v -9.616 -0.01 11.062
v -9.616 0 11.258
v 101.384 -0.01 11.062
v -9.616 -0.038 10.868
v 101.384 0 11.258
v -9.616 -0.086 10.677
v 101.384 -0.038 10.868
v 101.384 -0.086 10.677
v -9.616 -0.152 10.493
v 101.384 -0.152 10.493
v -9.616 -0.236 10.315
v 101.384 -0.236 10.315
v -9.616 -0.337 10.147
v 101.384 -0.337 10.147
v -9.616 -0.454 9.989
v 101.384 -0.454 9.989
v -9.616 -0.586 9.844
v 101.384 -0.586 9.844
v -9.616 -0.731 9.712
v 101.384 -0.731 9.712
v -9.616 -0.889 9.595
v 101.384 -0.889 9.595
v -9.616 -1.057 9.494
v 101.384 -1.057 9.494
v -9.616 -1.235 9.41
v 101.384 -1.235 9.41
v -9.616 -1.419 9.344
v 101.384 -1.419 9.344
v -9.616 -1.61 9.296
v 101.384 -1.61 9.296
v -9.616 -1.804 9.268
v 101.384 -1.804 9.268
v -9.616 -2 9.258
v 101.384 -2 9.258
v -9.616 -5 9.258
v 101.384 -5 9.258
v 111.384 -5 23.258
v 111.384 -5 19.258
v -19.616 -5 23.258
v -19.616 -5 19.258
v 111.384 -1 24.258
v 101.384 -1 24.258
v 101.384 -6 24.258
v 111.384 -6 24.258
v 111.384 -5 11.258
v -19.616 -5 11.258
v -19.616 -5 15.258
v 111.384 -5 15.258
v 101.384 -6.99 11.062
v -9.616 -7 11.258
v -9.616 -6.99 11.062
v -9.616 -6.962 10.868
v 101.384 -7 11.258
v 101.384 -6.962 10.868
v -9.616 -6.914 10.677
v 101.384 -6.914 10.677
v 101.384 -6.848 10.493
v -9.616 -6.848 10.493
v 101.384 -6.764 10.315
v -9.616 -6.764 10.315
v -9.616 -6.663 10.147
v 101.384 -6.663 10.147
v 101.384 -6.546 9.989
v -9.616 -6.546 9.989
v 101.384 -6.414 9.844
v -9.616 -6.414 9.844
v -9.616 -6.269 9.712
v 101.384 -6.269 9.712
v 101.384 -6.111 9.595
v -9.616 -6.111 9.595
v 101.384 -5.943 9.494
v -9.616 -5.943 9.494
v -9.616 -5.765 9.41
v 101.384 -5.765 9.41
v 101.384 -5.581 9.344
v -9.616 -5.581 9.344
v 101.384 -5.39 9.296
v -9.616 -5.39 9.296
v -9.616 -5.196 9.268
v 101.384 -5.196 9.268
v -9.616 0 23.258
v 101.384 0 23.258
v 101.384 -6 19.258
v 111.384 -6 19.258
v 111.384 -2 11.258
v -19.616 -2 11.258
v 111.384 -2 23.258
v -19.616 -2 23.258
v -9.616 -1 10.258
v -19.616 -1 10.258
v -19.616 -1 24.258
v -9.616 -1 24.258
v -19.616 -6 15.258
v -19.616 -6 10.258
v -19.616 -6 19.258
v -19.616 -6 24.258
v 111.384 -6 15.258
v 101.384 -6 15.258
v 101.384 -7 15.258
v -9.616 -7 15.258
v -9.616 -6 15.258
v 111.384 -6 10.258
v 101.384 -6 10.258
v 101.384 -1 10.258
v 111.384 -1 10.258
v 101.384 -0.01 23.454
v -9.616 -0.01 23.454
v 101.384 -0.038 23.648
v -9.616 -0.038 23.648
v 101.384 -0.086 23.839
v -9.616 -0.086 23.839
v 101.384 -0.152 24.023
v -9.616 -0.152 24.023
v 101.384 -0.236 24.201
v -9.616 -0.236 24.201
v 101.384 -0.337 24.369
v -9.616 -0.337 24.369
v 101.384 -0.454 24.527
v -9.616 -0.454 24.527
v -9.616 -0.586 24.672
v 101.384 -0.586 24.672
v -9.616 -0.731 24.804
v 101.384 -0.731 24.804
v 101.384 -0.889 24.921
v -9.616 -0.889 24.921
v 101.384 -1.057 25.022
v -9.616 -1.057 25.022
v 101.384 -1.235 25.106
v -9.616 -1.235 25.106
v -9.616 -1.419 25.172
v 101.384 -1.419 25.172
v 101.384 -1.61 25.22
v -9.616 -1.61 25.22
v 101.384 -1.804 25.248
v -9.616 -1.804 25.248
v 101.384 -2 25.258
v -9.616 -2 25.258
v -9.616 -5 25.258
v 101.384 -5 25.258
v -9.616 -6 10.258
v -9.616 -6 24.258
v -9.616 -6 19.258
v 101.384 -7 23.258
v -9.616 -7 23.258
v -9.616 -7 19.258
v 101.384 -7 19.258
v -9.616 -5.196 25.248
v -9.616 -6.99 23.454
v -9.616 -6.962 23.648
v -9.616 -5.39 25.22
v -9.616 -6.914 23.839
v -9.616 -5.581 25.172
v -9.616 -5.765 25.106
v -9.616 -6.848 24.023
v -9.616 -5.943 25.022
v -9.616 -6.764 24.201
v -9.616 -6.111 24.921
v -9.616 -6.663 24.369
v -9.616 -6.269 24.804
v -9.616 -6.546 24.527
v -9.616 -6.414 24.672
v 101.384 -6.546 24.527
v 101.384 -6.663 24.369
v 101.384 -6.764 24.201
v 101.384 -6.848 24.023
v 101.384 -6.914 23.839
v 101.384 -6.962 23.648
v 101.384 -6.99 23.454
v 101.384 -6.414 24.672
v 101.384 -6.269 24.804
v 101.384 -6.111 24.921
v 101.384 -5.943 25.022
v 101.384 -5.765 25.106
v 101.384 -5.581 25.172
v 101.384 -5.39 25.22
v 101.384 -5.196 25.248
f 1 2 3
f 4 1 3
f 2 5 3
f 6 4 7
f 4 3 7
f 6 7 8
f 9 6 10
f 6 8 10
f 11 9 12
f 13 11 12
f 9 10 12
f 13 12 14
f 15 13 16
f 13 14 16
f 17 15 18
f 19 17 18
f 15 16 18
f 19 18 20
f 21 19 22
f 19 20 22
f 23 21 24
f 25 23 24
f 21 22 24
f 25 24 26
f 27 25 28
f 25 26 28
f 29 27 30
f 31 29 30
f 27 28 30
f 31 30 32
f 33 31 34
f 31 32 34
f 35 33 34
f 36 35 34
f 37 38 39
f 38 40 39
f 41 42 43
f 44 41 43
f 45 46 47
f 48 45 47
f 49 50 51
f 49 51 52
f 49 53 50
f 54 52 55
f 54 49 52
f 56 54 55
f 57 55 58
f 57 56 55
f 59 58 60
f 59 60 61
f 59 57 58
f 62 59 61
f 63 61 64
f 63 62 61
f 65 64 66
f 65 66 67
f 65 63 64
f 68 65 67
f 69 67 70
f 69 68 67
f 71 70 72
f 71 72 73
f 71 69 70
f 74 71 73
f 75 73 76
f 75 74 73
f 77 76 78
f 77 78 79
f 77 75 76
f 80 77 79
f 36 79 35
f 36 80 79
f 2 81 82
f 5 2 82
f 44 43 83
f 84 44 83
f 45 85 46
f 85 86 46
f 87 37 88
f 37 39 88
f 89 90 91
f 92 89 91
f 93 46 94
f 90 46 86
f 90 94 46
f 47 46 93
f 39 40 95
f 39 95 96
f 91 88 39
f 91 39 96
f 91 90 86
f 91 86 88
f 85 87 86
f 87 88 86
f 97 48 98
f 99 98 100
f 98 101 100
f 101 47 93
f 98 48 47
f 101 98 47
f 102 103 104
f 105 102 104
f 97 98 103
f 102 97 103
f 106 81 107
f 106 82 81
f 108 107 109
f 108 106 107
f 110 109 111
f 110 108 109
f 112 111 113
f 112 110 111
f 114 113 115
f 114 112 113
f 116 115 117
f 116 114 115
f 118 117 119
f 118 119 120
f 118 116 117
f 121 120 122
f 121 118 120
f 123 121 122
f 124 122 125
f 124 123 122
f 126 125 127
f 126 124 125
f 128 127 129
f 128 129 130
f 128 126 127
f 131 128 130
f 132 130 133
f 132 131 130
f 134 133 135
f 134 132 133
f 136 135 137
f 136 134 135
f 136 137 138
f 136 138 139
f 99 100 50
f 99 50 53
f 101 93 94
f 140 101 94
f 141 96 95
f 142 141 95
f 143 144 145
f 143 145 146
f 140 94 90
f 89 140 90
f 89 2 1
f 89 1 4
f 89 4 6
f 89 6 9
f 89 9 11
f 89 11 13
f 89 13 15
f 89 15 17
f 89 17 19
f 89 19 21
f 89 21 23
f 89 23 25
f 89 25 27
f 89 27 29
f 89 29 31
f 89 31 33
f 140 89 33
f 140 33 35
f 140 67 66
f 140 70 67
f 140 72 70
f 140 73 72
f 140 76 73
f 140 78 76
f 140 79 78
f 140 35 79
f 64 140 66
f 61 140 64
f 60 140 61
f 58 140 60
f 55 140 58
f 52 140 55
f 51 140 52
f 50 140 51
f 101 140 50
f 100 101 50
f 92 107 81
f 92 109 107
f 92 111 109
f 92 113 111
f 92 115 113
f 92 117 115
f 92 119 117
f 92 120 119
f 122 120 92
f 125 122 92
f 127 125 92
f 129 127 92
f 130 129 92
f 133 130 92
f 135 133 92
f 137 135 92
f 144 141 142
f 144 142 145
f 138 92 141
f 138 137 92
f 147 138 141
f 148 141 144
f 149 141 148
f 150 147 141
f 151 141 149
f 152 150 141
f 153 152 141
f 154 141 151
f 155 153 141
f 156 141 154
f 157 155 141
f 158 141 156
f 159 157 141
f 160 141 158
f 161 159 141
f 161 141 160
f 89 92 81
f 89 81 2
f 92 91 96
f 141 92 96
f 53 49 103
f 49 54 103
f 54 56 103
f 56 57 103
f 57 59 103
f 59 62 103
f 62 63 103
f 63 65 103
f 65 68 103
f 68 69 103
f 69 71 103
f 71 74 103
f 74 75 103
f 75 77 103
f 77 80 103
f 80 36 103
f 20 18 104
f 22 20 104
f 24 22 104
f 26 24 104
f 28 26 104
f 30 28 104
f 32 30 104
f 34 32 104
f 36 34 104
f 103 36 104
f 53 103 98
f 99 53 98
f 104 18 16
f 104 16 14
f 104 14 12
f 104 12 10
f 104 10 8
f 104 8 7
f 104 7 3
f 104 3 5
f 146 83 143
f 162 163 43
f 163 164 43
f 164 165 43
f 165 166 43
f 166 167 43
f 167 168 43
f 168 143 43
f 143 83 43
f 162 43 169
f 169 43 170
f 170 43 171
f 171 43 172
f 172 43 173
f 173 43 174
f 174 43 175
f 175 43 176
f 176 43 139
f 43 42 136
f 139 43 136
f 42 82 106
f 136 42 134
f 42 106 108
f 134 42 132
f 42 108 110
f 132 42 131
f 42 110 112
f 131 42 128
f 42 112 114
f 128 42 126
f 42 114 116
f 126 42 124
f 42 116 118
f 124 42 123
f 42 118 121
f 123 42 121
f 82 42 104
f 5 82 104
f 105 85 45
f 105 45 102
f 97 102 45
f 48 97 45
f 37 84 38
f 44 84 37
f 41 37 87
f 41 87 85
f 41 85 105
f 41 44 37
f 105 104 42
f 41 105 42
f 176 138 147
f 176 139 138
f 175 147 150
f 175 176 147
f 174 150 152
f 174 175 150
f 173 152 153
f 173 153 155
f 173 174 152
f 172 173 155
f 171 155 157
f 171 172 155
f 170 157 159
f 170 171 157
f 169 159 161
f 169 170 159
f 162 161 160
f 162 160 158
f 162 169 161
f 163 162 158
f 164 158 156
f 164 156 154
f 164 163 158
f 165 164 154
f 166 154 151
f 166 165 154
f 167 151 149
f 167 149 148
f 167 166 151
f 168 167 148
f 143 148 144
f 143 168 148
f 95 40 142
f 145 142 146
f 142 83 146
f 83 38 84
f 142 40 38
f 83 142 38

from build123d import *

# Parameters (mm, degrees)
F0_W     = 121
F0_H     = 16
F1_DEPTH = 7
F3_DEPTH = 121.001
F5_DEPTH = 10
F7_DEPTH = 10
F8_R     = 2


with BuildPart() as f1:
    # F0 (on Front) → F1 (new body)
    with BuildSketch(Plane.XZ):
        with Locations((40.8839493543, 17.2579787597)):
            Rectangle(F0_W, F0_H)
    extrude(amount=F1_DEPTH)

    # F2 (on face) → F3 (cut, through all)
    with BuildSketch(Plane.YZ.offset(101.3839493543)):
        Polygon((-7, 19.2579787597), (-7, 15.2579787597), (-5, 15.2579787597), (-5, 11.2579787597), (-2, 11.2579787597), (-2, 23.2579787597), (-5, 23.2579787597), (-5, 19.2579787597), align=None)
    extrude(amount=-F3_DEPTH, mode=Mode.SUBTRACT)

    # F4 (on face) → F5 (join)
    with BuildSketch(Plane.YZ.offset(101.3839493543)):
        Polygon((-6, 15.2579787597), (-6, 10.2579787597), (-1, 10.2579787597), (-1, 24.2579787597), (-6, 24.2579787597), (-6, 19.2579787597), (-5, 19.2579787597), (-5, 23.2579787597), (-2, 23.2579787597), (-2, 11.2579787597), (-5, 11.2579787597), (-5, 15.2579787597), align=None)
    extrude(amount=F5_DEPTH)

    # F6 (on face) → F7 (cut)
    with BuildSketch(Plane(origin=(-19.6160506457, 0, 0), x_dir=(0, -1, 0), z_dir=(-1, 0, 0))):
        Polygon((1, 24.2579787597), (6, 24.2579787597), (6, 19.2579787597), (7, 19.2579787597), (7, 25.2579787597), (0, 25.2579787597), (0, 9.2579787597), (7, 9.2579787597), (7, 15.2579787597), (6, 15.2579787597), (6, 10.2579787597), (1, 10.2579787597), align=None)
    extrude(amount=-F7_DEPTH, mode=Mode.SUBTRACT)

    # F8
    f8_edges = [f1.edges().sort_by_distance(p)[0] for p in [
        (45.883949, -7, 25.257979),
        (45.883949, -7, 9.257979),
        (45.883949, 0, 25.257979),
        (45.883949, 0, 9.257979),
    ]]
    fillet(f8_edges, radius=F8_R)


solid = f1.part
